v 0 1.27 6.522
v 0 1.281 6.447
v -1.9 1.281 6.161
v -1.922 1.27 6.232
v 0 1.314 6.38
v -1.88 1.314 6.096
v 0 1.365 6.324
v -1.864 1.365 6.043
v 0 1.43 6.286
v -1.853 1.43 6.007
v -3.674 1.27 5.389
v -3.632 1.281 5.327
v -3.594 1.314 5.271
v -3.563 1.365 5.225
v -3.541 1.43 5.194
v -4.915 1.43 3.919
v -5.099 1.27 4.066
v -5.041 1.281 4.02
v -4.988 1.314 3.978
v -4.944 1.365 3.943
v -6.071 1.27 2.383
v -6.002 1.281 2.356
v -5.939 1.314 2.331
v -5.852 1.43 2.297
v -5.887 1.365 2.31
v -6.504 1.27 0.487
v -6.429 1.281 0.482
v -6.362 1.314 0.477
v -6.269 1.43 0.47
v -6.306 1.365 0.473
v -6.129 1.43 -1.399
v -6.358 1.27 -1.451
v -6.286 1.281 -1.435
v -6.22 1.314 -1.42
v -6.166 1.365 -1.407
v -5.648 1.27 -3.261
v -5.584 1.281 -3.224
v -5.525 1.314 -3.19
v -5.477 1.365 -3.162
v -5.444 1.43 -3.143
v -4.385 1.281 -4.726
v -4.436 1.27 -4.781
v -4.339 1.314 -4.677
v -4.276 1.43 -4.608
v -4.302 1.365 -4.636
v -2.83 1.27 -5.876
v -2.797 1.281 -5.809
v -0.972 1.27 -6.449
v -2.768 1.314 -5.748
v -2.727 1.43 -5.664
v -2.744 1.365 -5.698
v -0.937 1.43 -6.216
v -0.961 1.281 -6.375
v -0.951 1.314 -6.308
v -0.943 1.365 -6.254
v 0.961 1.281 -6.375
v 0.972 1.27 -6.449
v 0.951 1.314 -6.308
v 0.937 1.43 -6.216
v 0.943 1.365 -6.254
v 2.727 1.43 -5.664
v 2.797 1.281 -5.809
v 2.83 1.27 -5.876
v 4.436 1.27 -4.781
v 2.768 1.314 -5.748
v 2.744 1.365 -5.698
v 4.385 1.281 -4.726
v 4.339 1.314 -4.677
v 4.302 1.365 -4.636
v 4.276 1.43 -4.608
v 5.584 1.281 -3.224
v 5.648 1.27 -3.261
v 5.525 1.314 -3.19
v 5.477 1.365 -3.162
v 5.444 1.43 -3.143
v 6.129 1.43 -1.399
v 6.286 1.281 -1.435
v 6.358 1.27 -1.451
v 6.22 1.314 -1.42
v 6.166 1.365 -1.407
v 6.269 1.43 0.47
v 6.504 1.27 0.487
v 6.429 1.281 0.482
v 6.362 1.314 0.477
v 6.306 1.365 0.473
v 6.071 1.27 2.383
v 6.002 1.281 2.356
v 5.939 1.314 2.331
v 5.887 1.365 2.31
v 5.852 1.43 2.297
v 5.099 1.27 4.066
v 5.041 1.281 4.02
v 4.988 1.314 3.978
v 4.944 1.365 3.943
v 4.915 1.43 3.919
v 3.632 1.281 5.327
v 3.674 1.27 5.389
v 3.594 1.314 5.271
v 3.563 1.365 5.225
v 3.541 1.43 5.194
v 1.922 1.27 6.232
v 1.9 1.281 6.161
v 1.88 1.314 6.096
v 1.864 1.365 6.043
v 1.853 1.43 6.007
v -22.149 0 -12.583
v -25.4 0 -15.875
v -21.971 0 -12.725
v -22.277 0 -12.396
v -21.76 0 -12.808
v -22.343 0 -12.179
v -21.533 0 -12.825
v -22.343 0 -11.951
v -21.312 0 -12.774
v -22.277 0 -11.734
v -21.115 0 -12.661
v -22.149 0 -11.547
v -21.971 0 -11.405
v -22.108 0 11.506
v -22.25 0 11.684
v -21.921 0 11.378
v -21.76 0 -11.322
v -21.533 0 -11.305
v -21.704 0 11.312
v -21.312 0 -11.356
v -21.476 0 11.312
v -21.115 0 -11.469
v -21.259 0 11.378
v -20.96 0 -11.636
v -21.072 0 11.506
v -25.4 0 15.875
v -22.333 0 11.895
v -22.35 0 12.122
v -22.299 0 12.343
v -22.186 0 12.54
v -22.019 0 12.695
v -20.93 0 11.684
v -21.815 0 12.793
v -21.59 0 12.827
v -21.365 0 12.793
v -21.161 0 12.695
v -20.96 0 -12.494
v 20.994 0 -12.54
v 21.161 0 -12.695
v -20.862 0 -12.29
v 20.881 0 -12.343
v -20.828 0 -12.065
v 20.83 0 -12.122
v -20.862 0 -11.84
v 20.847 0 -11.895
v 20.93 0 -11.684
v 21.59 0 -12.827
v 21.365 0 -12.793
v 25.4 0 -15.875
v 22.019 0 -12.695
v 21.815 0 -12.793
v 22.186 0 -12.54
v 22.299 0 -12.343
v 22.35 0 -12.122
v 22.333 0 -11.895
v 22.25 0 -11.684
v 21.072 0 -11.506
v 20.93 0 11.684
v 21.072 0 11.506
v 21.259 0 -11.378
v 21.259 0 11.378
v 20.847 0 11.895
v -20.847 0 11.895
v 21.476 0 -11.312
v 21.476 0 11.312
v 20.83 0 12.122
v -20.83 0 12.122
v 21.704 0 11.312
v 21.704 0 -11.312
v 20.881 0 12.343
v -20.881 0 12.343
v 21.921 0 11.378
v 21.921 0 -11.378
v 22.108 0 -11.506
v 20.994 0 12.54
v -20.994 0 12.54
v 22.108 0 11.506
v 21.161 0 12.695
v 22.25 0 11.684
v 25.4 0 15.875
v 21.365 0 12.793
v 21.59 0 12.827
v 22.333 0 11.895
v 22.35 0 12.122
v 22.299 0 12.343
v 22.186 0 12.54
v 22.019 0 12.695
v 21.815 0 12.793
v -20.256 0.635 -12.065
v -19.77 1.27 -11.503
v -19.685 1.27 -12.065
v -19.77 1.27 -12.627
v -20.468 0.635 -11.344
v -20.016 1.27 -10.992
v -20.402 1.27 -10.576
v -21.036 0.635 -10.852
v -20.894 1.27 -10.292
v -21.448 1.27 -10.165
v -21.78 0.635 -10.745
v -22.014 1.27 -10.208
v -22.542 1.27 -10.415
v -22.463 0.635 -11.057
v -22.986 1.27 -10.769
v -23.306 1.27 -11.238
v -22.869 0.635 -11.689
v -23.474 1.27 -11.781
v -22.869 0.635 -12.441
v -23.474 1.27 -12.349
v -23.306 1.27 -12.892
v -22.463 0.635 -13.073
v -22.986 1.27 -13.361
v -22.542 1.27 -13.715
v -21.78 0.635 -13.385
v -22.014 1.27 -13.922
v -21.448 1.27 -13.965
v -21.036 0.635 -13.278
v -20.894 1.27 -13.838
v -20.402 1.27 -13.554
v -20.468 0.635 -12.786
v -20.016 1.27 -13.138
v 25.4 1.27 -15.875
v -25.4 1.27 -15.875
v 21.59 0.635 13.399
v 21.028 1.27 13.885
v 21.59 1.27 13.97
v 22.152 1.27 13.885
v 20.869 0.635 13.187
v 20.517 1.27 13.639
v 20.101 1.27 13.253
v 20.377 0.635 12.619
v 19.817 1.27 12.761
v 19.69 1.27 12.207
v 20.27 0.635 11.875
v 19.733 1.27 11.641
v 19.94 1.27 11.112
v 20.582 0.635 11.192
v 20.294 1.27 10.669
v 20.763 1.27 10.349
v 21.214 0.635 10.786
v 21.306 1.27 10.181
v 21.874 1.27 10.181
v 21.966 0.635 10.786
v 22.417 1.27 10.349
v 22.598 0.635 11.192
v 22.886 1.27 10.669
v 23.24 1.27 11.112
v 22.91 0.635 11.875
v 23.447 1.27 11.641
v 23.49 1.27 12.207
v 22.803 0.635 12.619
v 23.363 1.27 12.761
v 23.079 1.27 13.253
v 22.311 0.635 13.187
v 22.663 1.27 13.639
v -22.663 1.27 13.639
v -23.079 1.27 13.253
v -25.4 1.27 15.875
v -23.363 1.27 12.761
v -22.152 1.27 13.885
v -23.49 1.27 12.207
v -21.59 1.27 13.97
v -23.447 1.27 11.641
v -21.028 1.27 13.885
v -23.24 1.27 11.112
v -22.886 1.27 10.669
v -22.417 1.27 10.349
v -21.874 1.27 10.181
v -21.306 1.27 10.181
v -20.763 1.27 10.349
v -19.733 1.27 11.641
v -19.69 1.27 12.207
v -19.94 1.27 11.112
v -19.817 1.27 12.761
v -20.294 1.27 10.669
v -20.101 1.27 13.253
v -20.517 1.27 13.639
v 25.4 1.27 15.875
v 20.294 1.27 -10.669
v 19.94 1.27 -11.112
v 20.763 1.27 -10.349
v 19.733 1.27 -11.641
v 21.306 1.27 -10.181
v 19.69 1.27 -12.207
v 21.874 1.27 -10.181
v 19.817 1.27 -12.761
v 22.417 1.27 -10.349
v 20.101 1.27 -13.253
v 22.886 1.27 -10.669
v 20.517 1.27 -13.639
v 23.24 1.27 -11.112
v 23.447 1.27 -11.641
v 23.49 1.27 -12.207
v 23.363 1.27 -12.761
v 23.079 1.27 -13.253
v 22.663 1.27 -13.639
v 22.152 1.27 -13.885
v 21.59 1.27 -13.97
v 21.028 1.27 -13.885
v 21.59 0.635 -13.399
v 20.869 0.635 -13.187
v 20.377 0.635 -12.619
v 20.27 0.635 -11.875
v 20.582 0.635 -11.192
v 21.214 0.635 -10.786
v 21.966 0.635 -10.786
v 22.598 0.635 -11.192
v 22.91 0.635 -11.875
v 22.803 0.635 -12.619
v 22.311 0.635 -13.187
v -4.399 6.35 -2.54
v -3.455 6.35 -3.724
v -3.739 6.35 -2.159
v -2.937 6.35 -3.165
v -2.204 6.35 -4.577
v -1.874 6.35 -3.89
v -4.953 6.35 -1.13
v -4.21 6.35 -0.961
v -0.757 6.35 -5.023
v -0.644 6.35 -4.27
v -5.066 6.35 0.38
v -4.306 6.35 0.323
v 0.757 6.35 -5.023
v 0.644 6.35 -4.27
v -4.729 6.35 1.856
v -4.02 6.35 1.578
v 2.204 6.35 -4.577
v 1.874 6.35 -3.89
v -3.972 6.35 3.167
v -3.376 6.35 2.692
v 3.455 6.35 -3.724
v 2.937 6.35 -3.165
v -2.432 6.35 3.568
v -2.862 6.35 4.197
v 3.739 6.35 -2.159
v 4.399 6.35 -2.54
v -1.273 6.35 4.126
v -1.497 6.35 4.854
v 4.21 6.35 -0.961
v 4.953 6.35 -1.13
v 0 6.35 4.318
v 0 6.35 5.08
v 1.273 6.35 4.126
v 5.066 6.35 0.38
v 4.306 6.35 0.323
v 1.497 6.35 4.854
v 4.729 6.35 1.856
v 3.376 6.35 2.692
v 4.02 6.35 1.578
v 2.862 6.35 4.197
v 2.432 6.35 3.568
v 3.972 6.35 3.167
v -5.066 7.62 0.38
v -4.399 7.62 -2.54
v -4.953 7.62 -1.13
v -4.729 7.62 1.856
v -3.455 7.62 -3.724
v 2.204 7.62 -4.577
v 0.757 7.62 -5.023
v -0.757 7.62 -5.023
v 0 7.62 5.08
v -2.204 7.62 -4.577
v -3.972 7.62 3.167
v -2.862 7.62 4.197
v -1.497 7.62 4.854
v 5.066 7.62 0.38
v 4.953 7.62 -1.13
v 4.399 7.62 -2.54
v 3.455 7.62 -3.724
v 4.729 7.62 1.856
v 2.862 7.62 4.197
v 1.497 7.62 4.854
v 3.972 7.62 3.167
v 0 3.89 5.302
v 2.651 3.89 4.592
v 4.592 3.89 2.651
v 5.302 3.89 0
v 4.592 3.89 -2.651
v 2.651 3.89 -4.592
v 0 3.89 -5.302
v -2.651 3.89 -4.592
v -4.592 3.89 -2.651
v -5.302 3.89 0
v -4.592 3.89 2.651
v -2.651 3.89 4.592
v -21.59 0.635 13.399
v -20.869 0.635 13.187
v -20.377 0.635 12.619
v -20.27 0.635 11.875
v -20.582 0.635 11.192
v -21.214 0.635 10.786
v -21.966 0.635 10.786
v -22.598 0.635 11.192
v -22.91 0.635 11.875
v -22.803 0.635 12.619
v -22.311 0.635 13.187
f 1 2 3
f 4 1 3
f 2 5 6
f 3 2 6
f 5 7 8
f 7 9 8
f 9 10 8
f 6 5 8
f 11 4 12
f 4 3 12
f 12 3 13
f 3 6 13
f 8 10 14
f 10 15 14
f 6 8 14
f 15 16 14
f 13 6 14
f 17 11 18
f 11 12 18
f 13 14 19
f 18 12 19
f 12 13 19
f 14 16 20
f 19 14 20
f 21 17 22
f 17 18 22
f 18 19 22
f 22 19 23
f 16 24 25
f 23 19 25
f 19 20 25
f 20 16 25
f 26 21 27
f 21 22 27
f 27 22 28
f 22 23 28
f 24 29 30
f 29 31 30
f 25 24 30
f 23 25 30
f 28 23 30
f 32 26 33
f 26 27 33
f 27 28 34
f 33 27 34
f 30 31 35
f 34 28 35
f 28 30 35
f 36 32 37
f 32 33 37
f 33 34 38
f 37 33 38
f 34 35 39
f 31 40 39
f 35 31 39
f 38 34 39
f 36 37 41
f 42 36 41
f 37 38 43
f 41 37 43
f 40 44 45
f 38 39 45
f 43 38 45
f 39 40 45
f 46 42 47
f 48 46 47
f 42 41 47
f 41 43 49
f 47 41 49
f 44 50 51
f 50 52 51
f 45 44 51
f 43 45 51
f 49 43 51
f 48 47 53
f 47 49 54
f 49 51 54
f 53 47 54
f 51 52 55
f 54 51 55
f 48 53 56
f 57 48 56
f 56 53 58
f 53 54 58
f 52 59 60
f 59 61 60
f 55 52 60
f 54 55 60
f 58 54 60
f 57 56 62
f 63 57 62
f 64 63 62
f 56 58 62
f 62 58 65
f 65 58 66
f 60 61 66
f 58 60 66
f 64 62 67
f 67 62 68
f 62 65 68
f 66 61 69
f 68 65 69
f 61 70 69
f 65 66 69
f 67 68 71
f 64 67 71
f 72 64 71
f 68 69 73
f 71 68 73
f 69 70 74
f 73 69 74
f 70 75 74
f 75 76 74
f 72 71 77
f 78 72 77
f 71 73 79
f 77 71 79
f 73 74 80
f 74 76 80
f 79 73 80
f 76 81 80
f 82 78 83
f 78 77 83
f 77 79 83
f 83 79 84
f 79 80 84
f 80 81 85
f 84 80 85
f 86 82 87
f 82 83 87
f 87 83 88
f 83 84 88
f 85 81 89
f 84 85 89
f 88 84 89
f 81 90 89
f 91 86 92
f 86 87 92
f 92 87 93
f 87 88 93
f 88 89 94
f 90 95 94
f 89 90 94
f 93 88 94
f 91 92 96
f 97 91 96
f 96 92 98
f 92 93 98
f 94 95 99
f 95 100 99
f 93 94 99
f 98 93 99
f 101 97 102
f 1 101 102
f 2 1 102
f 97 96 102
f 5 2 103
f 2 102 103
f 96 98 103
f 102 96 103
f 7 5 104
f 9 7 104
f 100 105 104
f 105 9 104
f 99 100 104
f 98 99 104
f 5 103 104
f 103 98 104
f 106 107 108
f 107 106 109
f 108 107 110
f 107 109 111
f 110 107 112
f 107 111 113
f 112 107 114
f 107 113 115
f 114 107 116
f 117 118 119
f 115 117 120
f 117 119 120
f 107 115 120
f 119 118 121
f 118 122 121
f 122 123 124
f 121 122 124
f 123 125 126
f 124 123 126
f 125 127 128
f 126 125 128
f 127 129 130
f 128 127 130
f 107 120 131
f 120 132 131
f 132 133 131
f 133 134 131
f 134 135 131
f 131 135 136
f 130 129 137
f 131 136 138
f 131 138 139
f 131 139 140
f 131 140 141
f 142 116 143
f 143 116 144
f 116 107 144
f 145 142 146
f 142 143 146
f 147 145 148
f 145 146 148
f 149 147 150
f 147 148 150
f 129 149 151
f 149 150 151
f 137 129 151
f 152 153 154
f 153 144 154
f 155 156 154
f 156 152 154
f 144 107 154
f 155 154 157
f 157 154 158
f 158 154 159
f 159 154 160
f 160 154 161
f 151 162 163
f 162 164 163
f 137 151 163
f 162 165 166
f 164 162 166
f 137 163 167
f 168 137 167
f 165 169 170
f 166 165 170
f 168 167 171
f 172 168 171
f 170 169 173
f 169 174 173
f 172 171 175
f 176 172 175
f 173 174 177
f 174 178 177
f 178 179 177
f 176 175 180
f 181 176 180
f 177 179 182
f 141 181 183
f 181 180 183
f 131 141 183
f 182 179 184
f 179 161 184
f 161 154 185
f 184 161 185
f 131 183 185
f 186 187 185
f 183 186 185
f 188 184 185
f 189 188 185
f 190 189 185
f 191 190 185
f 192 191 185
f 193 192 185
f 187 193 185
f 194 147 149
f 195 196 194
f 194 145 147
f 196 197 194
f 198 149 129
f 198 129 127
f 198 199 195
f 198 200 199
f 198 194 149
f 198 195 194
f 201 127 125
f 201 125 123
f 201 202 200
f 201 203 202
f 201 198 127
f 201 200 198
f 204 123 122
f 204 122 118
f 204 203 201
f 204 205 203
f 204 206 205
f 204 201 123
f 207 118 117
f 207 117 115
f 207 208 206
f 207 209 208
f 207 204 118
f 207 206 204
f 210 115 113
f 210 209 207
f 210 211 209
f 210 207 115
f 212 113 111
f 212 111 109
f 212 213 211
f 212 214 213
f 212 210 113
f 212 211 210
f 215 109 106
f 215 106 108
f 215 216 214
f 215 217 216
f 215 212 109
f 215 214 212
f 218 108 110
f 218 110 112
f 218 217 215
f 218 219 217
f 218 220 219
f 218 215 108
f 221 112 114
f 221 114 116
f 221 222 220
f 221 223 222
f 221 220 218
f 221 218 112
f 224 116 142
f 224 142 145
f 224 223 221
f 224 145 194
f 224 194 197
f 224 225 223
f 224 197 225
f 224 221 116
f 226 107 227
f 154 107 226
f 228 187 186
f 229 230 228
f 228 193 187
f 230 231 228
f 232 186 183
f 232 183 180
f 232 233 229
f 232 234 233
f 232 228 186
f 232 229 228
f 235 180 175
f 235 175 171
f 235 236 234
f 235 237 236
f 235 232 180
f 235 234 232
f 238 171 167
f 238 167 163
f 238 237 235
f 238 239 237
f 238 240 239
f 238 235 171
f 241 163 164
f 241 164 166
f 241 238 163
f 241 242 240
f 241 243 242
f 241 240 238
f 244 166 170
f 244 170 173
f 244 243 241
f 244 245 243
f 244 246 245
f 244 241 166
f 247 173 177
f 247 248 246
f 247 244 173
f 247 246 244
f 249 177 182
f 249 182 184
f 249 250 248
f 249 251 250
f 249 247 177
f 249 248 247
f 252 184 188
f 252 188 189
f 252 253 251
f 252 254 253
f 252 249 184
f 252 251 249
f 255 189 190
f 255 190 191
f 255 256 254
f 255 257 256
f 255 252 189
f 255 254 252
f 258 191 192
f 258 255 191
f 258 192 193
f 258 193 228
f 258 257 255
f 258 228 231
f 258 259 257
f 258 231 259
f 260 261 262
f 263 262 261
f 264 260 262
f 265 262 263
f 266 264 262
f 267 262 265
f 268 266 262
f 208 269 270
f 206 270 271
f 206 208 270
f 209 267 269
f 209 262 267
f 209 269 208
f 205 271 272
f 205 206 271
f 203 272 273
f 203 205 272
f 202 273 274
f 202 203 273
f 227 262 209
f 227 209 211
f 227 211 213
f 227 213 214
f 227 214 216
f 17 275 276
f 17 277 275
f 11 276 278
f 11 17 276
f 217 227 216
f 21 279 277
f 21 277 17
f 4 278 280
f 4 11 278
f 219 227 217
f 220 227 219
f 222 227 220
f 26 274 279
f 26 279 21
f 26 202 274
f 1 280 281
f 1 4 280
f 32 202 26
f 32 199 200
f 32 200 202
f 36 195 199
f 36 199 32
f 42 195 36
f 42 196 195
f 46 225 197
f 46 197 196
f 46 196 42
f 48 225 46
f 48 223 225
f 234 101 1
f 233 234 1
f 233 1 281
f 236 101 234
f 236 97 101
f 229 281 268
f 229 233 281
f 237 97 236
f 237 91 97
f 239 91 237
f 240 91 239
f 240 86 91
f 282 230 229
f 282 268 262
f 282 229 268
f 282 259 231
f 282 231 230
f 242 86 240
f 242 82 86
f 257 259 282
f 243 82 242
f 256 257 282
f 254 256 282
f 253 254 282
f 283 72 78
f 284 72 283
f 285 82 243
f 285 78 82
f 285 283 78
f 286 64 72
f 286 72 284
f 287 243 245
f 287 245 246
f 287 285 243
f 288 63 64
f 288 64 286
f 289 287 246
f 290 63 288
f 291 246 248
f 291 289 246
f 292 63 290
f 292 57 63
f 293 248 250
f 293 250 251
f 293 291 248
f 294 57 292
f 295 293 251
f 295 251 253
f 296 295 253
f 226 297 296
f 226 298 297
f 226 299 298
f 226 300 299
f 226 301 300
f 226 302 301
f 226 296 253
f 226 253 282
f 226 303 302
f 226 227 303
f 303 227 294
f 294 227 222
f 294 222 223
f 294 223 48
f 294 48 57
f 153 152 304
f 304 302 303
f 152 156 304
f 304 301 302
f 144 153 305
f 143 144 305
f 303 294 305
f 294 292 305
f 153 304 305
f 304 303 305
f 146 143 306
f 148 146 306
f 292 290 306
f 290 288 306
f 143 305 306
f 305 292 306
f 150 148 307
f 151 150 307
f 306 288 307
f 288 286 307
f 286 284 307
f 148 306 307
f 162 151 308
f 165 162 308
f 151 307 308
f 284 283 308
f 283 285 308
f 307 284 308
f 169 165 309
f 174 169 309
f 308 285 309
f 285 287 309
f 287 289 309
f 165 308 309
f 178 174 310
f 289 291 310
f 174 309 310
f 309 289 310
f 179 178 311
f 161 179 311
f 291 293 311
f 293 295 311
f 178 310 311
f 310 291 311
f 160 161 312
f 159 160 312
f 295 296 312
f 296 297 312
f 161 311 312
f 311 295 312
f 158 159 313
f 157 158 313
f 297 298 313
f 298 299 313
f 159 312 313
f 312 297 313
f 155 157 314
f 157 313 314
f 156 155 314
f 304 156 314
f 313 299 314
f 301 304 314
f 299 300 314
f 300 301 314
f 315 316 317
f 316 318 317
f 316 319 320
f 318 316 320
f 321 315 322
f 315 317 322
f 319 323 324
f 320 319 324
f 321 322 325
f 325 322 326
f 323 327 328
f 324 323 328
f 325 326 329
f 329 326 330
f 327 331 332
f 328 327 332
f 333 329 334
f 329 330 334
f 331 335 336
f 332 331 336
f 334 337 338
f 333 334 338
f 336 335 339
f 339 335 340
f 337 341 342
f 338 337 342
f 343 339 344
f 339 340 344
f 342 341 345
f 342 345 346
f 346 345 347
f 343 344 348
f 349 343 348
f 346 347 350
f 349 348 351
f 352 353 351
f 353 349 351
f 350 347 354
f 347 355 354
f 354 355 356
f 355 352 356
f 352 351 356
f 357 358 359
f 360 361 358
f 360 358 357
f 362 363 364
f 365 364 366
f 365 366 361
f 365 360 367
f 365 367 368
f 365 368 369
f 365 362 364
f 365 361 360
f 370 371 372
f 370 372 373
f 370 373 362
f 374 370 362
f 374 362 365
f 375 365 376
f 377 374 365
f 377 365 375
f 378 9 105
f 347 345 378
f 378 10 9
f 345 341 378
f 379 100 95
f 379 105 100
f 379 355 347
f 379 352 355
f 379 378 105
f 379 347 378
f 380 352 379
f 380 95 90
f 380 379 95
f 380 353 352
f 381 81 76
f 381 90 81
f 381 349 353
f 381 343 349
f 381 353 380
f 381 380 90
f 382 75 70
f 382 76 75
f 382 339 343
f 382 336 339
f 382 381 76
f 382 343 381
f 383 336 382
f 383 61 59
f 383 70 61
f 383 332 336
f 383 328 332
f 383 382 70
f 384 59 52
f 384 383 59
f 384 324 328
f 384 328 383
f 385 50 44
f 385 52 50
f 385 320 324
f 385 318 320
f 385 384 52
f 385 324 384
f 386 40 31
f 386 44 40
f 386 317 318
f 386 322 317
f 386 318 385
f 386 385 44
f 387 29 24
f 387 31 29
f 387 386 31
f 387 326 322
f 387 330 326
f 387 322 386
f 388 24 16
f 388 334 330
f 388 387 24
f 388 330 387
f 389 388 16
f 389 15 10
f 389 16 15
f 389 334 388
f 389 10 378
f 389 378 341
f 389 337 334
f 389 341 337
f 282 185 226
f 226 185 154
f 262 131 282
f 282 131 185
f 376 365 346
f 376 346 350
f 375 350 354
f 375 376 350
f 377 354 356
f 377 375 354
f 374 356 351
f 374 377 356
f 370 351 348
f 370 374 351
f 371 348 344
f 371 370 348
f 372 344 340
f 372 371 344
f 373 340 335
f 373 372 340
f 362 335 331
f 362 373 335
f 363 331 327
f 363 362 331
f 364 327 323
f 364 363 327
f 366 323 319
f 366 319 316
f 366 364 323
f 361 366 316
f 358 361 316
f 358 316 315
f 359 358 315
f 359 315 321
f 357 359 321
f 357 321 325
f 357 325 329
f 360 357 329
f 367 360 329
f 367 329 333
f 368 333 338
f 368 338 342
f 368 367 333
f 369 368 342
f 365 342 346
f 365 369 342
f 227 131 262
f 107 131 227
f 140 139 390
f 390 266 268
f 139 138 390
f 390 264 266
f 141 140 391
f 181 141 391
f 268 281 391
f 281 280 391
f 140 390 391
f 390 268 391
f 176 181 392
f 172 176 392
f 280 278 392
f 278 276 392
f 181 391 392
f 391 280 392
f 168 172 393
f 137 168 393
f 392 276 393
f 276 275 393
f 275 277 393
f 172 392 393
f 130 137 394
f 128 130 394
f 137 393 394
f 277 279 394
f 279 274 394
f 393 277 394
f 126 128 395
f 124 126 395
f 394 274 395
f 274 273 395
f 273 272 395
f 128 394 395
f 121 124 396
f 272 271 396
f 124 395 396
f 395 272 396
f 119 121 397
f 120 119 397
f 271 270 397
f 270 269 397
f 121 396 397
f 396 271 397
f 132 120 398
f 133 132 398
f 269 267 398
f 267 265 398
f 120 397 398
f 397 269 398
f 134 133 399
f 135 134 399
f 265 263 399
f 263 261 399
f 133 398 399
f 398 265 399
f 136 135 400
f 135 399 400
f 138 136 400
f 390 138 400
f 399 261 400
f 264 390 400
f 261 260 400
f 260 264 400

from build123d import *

# Parameters (mm, degrees)
SKETCH1_W                = 50.8
SKETCH1_H                = 31.75
BOSS_EXTRUDE1_DEPTH      = 1.27
BOSS_EXTRUDE2_DEPTH      = 6.35
BOSS_EXTRUDE2_DEPTH_BACK = 1.27
SKETCH2_R                = 6.35
CHAMFER1_SIZE            = 6.35
CHAMFER1_SIZE_2          = 2.54
FILLET1_R                = 0.254
SKETCH7_R                = 5.08
BOSS_EXTRUDE3_DEPTH      = 1.27


with BuildPart() as part:
    # Sketch1 → Boss-Extrude1 (new body)
    with BuildSketch(Plane(origin=(0, 0, 0), x_dir=(1, 0, 0), z_dir=(0, 1, 0))):
        Rectangle(SKETCH1_W, SKETCH1_H)
    extrude(amount=BOSS_EXTRUDE1_DEPTH)

    # Sketch2 → Boss-Extrude2 (add, two sides: drawn at the far end of the back side and taken through both)
    with BuildSketch(Plane(origin=(0, 1.27, 0), x_dir=(1, 0, 0), z_dir=(0, 1, 0)).offset(-BOSS_EXTRUDE2_DEPTH_BACK)):
        with Locations(Location((0, 0, 0), (0, 0, 270))):
            Circle(SKETCH2_R)
    extrude(amount=BOSS_EXTRUDE2_DEPTH + BOSS_EXTRUDE2_DEPTH_BACK)

    # Chamfer1
    # the kernel refuses this chamfer: 6.35, 2.54 mm, written as the material it takes off along each edge
    with BuildSketch(Plane(origin=(0, 7.62, 0), x_dir=(0, 0, 1), z_dir=(-1, 0, 0))) as chamfer1_piece_1_section:
        Polygon((6.35, -CHAMFER1_SIZE), (6.35 - CHAMFER1_SIZE_2, 0), (6.35, 0), align=None)
    chamfer1_piece_1 = revolve(axis=Axis((0, 7.62, 0), (0, 1, 0)), mode=Mode.PRIVATE)
    chamfer1_piece_1 = split(chamfer1_piece_1, bisect_by=Plane(origin=(0, 1.27, -5.09685111), z_dir=(0, 1, 0)), keep=Keep.TOP, mode=Mode.PRIVATE)
    add(chamfer1_piece_1, mode=Mode.SUBTRACT)

    # Fillet1
    fillet1_edges = [part.edges().sort_by_distance(p)[0] for p in [
        (0, 1.27, -6.35),
    ]]
    fillet(fillet1_edges, radius=FILLET1_R)

    # Sketch6 → Cut-Revolve1 (revolve, cut)
    with BuildSketch(Plane.XY.offset(12.065), mode=Mode.PRIVATE) as cut_revolve1_sk:
        Polygon((21.59, 1.27), (21.59, 0), (20.828, 0), (19.685, 1.27), align=None)
    cut_revolve1 = revolve(cut_revolve1_sk.sketch.rotate(Axis((21.59, 1.27, 12.065), (0, -1, 0)), 270), axis=Axis((21.59, 1.27, 12.065), (0, -1, 0)), mode=Mode.SUBTRACT)

    # Mirror1: Cut-Revolve1 across plane
    add(cut_revolve1.mirror(Plane.XY), mode=Mode.SUBTRACT)

    # Mirror2: Cut-Revolve1 across plane
    add(cut_revolve1.mirror(Plane(origin=(0, 0, 0), x_dir=(0, 0, 1), z_dir=(1, 0, 0))), mode=Mode.SUBTRACT)

    # Mirror2 copy 1 sketch → Mirror2 copy 1 (revolve, cut)
    with BuildSketch(Plane(origin=(0, 0, -12.065), x_dir=(-1, 0, 0), z_dir=(0, 0, -1))):
        Polygon((21.59, 1.27), (21.59, 0), (20.828, 0), (19.685, 1.27), align=None)
    revolve(axis=Axis((-21.59, 1.27, -12.065), (0, -1, 0)), mode=Mode.SUBTRACT)

    # Sketch7 → Boss-Extrude3 (add)
    with BuildSketch(Plane(origin=(0, 7.62, 0), x_dir=(1, 0, 0), z_dir=(0, 1, 0))):
        with Locations(Location((0, 0, 0), (0, 0, 270))):
            Circle(SKETCH7_R)
    extrude(amount=-BOSS_EXTRUDE3_DEPTH)


solid = part.part
